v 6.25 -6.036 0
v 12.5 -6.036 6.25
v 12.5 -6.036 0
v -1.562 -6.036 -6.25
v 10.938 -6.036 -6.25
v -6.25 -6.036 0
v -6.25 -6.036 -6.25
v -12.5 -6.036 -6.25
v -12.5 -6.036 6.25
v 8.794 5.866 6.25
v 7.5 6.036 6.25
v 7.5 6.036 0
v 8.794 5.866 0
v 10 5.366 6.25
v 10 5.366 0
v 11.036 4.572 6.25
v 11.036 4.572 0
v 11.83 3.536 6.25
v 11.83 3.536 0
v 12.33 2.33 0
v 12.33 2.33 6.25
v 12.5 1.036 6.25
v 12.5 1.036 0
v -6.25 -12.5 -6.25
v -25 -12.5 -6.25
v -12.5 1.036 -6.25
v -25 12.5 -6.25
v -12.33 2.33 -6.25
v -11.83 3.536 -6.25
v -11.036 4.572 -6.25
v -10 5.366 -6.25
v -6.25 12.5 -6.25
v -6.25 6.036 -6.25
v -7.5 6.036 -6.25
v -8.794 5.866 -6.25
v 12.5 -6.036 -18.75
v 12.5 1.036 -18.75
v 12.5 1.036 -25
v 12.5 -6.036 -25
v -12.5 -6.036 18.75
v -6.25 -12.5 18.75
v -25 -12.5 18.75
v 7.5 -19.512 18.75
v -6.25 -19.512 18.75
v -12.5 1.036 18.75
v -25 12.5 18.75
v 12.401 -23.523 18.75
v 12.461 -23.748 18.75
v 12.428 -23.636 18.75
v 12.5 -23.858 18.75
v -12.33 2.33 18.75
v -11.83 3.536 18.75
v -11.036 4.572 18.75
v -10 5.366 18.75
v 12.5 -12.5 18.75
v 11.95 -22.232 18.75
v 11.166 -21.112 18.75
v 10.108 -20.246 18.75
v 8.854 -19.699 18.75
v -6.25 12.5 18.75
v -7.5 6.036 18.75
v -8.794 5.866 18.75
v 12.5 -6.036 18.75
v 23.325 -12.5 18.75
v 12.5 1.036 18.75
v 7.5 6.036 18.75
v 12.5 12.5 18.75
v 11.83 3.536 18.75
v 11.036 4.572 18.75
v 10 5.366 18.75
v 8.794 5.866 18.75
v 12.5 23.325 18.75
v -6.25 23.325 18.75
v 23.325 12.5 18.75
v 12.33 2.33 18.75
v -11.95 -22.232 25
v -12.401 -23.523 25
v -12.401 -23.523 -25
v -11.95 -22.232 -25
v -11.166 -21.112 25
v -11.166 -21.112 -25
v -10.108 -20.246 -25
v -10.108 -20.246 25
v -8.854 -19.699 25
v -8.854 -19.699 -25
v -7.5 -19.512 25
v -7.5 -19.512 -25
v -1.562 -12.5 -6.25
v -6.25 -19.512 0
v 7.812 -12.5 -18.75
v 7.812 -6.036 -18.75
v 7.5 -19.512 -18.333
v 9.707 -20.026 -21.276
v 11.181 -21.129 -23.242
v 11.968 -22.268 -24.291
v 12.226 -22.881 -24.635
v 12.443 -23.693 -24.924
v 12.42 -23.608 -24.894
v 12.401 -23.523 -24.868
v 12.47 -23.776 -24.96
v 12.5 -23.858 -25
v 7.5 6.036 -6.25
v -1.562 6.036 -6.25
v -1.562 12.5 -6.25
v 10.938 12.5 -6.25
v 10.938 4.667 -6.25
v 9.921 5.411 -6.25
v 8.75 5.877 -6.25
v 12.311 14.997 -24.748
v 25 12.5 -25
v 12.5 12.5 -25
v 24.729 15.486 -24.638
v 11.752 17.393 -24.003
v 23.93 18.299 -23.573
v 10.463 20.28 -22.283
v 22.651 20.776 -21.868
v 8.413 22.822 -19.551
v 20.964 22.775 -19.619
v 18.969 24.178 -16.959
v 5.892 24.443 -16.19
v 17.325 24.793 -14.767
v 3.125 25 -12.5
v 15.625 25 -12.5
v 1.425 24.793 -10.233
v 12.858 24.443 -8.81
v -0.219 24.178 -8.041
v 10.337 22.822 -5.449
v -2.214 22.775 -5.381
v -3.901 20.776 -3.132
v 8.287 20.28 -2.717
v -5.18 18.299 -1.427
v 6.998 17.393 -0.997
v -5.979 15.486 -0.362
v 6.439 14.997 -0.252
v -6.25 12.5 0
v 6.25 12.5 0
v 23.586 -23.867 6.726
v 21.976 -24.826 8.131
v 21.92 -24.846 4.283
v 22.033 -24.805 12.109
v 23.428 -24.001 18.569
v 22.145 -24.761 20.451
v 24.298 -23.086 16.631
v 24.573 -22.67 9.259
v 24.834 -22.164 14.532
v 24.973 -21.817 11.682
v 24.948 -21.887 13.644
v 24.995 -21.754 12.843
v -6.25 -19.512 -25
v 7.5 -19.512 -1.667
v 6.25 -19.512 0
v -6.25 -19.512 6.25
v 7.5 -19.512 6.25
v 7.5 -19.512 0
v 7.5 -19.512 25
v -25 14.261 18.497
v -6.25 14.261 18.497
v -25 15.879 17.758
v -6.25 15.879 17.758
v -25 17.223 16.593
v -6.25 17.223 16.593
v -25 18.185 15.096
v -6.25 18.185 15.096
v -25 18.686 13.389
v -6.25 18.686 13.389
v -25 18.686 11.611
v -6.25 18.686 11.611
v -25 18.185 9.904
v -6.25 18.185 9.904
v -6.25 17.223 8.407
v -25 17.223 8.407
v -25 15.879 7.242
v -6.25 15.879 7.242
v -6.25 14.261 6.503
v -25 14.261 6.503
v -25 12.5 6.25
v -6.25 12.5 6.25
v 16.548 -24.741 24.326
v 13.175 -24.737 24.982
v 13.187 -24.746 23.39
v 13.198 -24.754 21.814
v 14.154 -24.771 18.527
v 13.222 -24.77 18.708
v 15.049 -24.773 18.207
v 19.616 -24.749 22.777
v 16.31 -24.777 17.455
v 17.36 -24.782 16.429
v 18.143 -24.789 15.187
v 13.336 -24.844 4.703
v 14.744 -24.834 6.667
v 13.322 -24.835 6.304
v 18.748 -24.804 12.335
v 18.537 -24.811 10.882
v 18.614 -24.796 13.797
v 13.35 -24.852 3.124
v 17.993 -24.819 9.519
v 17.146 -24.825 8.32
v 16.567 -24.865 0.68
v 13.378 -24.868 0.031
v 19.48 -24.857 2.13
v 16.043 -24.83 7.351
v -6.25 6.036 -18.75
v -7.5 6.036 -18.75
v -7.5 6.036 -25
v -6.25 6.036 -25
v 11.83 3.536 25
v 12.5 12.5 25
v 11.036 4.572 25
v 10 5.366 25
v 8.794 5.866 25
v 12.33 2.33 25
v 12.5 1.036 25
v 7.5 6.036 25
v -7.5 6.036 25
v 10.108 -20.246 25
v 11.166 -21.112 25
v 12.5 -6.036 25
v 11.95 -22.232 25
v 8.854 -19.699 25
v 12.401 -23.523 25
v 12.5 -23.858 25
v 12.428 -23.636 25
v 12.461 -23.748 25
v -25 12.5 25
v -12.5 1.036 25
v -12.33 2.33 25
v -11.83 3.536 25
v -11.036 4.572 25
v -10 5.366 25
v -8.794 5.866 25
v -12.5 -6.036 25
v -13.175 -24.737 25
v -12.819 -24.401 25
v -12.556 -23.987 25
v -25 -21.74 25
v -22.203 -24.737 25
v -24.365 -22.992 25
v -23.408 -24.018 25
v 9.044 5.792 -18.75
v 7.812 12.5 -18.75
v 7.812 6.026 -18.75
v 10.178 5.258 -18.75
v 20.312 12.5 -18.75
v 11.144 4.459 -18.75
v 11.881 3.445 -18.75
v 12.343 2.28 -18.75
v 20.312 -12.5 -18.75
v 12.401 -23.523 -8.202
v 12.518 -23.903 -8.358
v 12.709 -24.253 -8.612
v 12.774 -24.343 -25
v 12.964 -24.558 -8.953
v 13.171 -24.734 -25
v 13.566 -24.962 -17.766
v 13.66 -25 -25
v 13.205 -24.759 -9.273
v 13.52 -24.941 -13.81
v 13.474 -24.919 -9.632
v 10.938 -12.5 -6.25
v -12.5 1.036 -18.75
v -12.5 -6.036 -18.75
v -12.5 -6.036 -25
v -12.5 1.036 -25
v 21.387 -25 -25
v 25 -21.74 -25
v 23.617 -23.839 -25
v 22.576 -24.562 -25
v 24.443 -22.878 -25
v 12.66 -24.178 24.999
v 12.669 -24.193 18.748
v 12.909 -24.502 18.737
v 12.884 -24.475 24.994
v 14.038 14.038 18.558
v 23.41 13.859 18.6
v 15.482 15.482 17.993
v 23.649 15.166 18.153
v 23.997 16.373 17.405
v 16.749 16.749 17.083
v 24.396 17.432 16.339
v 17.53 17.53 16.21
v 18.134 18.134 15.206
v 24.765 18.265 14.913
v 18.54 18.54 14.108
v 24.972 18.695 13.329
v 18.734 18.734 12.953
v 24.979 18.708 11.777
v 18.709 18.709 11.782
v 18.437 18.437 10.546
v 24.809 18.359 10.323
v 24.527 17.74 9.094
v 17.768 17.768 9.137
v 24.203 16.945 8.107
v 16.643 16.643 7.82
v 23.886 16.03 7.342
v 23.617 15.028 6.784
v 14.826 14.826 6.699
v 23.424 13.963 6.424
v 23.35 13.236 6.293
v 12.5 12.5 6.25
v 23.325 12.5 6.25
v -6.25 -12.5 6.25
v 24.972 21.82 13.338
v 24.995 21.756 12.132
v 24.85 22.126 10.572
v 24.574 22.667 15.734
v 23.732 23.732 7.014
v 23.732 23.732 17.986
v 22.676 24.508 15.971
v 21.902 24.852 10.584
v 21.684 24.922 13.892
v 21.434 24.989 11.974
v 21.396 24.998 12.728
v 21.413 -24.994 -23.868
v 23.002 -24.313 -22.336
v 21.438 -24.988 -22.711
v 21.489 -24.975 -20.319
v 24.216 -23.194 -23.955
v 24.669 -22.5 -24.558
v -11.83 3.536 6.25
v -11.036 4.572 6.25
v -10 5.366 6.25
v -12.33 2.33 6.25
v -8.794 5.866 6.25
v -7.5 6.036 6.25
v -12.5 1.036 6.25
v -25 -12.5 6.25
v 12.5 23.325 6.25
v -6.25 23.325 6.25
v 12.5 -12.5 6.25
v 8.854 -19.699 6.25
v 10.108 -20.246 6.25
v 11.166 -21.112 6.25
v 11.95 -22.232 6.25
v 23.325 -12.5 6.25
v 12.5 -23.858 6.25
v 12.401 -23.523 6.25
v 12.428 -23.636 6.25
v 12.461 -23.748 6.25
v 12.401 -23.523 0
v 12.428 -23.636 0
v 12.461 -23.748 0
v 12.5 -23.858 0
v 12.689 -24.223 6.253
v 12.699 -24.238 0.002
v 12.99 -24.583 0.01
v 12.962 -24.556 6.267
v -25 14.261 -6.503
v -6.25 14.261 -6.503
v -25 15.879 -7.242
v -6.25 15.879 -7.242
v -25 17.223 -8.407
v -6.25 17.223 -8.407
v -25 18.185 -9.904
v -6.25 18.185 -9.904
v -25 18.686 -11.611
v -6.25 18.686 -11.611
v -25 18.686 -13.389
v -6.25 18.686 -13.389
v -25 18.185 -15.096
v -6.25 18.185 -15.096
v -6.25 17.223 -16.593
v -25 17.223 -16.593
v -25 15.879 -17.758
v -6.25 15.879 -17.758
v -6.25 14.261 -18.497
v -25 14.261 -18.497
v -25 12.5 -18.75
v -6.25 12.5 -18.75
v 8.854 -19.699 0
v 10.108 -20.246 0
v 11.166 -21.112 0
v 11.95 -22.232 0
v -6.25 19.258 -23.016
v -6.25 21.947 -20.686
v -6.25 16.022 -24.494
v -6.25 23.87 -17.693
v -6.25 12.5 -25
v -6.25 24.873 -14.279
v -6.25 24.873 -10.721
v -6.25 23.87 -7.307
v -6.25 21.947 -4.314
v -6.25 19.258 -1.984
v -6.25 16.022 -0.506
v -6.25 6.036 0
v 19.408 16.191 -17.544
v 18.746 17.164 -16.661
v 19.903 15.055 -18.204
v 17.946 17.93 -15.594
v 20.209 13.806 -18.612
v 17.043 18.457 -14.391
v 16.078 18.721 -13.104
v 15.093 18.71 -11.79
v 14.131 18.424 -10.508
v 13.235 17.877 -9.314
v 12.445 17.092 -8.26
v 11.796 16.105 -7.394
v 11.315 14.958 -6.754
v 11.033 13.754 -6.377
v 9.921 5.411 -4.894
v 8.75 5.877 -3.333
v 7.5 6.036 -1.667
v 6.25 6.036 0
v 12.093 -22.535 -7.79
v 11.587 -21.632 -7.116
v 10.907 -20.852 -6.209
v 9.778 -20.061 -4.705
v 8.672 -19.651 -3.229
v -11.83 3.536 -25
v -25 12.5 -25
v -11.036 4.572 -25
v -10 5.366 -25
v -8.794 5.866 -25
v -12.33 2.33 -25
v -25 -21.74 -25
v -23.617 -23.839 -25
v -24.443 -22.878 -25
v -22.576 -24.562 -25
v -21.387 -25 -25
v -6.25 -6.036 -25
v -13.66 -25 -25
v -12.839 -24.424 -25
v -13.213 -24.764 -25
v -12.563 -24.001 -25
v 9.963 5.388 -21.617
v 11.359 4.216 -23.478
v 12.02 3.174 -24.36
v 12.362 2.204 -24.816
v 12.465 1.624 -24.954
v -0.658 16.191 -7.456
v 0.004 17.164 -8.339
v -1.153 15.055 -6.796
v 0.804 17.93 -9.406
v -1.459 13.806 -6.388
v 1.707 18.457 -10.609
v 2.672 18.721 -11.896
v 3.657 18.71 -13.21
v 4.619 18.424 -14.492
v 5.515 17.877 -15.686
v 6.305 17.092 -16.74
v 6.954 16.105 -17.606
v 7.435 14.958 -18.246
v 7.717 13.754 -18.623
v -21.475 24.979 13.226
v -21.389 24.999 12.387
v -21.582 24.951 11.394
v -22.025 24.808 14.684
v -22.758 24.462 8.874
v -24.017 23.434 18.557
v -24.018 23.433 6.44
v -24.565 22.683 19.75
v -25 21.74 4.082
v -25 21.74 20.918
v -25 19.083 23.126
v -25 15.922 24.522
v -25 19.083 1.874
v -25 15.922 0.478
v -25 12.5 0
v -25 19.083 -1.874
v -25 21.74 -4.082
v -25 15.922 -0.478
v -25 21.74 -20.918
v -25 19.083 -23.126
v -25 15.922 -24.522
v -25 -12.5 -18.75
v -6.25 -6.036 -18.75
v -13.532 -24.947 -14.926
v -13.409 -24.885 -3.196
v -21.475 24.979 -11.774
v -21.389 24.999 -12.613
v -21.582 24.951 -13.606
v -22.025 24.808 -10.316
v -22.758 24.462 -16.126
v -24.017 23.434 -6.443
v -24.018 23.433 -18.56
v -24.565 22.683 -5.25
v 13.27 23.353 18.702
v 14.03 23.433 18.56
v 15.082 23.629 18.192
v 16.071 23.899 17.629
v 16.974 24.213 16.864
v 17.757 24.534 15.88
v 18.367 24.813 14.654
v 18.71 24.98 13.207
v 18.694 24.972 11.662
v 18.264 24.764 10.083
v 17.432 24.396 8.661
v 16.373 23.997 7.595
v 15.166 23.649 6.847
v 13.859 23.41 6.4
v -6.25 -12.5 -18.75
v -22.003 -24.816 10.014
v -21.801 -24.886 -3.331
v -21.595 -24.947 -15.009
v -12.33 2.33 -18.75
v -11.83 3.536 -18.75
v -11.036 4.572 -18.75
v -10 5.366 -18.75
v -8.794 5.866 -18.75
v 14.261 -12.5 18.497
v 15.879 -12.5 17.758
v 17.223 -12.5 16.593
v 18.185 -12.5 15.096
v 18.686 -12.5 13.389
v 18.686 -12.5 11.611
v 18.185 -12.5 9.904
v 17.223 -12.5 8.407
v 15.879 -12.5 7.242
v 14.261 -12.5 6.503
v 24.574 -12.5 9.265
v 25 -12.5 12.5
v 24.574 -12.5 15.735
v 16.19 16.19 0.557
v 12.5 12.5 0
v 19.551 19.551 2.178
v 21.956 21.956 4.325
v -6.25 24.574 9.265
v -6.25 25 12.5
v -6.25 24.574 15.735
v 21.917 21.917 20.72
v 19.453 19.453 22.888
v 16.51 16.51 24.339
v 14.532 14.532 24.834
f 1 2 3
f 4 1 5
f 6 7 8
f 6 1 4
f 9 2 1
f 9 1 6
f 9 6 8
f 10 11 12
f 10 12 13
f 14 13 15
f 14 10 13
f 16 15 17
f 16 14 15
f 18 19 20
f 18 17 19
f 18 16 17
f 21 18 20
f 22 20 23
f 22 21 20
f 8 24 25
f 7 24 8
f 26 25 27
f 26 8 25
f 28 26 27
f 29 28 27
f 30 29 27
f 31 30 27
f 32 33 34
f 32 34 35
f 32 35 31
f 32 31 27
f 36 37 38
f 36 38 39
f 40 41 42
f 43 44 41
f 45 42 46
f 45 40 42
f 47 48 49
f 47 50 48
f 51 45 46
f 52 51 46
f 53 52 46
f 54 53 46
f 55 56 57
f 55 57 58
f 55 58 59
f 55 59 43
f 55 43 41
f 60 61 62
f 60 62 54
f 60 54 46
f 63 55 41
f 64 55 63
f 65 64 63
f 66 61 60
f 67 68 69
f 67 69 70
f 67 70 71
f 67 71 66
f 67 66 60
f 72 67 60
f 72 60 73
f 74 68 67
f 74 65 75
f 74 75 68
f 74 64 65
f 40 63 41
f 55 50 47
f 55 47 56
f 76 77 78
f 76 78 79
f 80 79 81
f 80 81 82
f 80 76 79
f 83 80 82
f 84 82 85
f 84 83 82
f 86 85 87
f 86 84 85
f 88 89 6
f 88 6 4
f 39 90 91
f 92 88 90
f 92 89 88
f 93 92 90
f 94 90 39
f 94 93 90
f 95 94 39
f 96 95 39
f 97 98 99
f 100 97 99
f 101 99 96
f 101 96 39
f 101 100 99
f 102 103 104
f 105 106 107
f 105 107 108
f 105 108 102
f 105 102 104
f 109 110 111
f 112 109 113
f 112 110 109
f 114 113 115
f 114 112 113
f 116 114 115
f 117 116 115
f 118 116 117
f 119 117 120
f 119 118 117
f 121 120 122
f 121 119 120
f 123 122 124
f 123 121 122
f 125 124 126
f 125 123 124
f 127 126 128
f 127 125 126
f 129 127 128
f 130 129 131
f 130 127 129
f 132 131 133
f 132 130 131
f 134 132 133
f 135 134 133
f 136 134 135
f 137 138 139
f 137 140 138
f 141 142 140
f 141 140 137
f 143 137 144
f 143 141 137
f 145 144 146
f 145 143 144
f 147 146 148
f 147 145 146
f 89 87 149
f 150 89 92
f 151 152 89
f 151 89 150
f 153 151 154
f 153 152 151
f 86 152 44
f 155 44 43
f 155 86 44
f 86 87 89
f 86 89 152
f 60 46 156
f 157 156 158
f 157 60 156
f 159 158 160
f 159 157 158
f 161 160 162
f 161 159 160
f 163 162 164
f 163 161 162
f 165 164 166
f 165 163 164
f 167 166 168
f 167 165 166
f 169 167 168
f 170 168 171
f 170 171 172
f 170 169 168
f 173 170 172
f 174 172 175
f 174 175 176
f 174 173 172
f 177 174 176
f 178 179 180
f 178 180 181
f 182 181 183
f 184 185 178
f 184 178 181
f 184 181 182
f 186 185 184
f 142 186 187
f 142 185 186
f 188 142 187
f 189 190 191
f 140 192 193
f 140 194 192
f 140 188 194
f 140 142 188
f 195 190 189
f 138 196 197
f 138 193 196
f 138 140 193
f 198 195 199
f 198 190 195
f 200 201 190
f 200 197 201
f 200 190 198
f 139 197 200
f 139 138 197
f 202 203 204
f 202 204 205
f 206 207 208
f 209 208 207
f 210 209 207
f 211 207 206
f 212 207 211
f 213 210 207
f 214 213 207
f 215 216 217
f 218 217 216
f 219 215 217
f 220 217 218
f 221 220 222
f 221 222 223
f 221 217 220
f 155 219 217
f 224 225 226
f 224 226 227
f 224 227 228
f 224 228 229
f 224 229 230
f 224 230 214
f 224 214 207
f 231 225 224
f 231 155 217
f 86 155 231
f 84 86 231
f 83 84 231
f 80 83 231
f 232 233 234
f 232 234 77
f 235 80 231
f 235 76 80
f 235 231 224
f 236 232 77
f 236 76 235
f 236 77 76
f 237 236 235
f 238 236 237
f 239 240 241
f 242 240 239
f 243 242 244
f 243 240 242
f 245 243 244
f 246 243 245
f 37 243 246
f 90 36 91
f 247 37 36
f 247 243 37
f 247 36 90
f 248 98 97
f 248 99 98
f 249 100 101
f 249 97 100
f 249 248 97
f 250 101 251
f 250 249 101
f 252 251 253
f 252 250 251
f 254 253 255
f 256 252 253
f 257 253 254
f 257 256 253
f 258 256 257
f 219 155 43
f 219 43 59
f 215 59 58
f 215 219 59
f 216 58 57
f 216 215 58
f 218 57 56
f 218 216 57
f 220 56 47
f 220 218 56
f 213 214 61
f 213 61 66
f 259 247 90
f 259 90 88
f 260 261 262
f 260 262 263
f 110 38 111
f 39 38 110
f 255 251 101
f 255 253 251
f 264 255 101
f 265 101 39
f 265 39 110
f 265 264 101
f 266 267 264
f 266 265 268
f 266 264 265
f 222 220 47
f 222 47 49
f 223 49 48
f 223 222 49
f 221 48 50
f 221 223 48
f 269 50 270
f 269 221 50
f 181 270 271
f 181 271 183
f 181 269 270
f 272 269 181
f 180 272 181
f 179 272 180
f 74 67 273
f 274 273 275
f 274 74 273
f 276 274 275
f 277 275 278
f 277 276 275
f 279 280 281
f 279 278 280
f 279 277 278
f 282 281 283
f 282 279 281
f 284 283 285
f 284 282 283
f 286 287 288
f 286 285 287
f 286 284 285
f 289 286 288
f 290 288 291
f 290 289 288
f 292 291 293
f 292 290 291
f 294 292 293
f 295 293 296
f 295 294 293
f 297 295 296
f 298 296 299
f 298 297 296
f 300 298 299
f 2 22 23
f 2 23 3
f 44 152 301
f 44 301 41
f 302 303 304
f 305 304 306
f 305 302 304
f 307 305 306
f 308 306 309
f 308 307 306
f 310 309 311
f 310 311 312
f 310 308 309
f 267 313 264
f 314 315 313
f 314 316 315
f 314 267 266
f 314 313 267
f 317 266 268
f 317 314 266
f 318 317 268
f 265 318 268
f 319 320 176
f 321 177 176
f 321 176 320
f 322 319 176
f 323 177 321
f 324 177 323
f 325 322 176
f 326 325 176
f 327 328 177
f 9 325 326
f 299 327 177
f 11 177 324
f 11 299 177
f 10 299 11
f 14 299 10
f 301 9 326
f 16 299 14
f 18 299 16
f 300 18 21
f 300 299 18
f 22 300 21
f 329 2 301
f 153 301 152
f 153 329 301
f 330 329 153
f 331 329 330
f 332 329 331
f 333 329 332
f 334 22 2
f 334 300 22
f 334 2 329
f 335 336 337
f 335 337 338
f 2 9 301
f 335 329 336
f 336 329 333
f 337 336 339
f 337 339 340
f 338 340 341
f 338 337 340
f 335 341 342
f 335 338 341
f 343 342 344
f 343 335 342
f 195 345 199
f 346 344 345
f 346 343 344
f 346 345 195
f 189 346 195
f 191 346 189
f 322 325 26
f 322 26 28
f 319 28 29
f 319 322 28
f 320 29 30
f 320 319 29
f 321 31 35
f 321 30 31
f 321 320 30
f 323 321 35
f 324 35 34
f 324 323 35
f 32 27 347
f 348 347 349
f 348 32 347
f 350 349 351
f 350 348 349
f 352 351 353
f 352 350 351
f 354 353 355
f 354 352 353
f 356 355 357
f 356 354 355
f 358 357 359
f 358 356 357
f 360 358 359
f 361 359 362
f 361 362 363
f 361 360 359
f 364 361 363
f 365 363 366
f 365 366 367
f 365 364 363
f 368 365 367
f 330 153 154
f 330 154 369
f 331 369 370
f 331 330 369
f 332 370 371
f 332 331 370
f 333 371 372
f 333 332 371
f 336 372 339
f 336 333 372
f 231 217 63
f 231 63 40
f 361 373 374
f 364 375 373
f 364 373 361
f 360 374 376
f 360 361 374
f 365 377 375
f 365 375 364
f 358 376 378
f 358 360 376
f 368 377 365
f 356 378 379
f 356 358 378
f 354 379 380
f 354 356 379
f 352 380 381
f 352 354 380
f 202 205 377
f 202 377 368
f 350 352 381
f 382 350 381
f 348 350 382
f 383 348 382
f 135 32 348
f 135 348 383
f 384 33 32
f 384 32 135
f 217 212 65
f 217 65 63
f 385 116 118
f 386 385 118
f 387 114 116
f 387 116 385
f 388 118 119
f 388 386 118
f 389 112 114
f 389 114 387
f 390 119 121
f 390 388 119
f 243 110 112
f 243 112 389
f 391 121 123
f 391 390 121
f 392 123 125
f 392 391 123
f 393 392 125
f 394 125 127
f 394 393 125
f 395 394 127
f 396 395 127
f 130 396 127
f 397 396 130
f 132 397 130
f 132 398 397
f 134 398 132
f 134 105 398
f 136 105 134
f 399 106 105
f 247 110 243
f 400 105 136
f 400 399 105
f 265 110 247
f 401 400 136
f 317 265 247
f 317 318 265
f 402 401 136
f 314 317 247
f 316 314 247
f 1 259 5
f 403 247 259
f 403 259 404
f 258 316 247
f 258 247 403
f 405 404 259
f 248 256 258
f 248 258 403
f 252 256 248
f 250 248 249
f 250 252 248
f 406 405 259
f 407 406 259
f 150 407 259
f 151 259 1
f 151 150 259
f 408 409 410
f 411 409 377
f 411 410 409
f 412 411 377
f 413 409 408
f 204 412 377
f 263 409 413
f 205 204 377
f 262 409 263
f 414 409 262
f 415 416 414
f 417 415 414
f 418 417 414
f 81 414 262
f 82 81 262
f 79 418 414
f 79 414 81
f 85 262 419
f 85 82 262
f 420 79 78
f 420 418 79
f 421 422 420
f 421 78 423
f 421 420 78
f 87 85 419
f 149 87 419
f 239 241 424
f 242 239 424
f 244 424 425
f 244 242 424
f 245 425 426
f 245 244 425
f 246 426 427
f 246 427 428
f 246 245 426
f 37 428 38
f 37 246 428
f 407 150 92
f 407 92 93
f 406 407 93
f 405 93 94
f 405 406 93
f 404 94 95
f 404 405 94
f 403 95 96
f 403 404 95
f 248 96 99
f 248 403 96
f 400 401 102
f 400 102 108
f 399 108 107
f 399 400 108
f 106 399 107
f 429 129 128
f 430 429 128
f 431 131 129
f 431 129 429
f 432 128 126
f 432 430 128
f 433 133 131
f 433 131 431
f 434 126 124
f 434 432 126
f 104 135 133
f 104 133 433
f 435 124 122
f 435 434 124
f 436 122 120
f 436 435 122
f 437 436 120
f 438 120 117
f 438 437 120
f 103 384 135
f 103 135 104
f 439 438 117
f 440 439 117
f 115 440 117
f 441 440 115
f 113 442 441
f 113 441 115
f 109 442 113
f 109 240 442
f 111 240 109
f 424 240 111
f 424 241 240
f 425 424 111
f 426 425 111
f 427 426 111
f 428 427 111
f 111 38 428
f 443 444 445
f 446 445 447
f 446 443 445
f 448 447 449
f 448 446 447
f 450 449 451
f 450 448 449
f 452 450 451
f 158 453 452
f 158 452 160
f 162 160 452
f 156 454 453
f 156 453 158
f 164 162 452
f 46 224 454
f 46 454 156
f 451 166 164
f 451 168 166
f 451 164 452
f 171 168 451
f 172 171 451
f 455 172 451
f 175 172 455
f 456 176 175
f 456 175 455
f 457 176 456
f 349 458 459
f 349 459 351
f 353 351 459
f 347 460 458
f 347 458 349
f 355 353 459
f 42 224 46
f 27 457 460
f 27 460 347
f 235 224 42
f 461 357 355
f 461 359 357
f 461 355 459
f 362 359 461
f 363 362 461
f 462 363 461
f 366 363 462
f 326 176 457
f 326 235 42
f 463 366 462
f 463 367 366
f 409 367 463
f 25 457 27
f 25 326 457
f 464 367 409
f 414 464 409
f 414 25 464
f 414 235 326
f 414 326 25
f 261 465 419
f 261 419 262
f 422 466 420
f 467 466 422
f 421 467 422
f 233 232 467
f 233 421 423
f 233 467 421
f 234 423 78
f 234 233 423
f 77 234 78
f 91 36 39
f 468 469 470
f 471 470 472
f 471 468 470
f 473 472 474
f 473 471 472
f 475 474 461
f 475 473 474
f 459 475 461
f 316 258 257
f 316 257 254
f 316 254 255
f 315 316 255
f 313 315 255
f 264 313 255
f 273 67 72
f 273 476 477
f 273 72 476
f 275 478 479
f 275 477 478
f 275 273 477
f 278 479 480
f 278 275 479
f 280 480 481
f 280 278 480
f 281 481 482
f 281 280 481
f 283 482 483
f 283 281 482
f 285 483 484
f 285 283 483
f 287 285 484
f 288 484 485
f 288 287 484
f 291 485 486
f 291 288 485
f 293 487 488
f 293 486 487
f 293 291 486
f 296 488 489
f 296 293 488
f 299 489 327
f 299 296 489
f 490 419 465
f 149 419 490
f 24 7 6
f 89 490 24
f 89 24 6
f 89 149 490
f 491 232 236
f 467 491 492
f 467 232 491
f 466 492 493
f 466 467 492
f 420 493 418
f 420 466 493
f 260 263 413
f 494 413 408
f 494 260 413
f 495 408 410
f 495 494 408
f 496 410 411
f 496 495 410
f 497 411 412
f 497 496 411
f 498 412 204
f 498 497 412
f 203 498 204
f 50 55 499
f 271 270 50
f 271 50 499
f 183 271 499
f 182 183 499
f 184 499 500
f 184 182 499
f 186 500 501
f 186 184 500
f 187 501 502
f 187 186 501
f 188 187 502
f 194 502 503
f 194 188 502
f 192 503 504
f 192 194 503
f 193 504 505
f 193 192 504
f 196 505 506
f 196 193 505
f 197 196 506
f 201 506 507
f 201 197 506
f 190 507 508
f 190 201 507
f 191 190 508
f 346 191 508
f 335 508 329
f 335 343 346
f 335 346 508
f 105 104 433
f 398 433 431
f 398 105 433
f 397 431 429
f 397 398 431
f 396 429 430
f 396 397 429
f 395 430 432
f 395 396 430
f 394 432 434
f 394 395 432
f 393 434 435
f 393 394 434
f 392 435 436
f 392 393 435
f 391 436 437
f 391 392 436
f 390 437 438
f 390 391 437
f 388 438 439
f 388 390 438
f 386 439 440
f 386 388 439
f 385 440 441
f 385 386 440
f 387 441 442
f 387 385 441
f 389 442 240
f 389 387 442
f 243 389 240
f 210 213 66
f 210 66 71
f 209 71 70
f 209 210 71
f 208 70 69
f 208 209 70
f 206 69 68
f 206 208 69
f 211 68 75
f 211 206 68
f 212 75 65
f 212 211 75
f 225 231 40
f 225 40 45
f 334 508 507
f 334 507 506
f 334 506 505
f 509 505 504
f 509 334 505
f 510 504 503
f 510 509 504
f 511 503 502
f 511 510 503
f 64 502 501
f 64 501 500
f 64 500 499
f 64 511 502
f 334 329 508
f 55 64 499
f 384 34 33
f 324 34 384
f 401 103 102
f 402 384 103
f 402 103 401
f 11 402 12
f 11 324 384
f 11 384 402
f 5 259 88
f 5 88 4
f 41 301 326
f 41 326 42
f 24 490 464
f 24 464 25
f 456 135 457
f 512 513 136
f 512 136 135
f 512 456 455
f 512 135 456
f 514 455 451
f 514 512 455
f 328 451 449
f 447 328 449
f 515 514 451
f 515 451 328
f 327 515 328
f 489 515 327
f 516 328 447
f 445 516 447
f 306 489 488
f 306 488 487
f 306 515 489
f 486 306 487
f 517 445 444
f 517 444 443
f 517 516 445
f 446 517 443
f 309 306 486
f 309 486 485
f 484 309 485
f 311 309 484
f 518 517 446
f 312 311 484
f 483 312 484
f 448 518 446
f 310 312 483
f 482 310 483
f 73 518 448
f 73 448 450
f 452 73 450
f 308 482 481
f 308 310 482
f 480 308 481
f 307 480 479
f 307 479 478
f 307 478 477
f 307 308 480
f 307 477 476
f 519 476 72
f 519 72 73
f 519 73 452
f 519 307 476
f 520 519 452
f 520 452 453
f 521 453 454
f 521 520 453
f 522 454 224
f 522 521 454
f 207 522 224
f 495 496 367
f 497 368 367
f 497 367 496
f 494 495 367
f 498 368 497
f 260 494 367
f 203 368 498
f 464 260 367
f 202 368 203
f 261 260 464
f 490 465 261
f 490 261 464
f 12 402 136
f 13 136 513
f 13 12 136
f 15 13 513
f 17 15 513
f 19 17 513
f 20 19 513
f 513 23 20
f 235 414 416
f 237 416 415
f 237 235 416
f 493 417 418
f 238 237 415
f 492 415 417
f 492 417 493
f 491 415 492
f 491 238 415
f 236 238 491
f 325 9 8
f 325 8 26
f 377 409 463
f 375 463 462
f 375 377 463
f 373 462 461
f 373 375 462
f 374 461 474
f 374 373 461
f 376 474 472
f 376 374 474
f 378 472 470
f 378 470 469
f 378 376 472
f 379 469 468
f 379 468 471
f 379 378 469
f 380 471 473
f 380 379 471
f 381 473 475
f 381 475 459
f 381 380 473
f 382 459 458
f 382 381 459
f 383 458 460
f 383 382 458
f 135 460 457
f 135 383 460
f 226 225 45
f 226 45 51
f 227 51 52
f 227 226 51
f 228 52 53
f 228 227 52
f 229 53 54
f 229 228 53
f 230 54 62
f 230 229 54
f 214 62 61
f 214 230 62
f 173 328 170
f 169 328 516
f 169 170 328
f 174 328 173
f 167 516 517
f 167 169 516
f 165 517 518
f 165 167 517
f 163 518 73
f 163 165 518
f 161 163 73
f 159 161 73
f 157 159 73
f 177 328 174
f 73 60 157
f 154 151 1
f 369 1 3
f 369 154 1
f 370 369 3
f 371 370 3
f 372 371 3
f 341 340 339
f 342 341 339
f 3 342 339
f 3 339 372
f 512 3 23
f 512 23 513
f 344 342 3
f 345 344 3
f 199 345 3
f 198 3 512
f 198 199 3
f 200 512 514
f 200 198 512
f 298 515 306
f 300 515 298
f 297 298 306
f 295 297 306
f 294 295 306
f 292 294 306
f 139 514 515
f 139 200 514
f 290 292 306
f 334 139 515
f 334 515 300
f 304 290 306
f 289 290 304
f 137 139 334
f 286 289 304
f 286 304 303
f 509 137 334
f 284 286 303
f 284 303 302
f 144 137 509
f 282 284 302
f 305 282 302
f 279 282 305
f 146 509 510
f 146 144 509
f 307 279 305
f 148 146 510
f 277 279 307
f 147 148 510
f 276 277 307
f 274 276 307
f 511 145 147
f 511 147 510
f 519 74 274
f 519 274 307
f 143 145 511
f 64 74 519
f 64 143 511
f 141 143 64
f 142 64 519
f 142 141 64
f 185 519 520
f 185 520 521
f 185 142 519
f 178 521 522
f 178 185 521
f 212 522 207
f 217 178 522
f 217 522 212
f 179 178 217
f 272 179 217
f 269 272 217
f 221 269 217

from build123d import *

# Parameters (mm, degrees)
F2_DEPTH = 25
F3_DEPTH = 25
F5_DEPTH = 50


with BuildPart() as f2:
    # F0 (on Front) → F2 (new body, symmetric)
    with BuildSketch(Plane.XZ):
        with BuildLine():
            Line((-25, 25), (-25, -25))
            Line((-25, -25), (-6.25, -25))
            Line((-6.25, -25), (-6.25, 0))
            Line((-6.25, 0), (12.5, -25))
            Line((12.5, -25), (25, -25))
            Line((25, -25), (6.25, 0))
            Line((6.25, 0), (12.5, 0))
            ThreePointArc((12.5, 0), (25, 12.5), (12.5, 25))
            Line((12.5, 25), (-25, 25))
        make_face()
        with BuildLine():
            Line((12.5, 6.25), (-6.25, 6.25))
            Line((-6.25, 6.25), (-6.25, 18.75))
            Line((-6.25, 18.75), (12.5, 18.75))
            ThreePointArc((12.5, 18.75), (18.75, 12.5), (12.5, 6.25))
        make_face(mode=Mode.SUBTRACT)
    extrude(amount=F2_DEPTH, both=True)

    # F1 (on Right) → F3 (intersect, symmetric)
    with BuildSketch(Plane.YZ):
        with BuildLine():
            Line((-25, -25), (12.5, -25))
            ThreePointArc((12.5, -25), (25, -12.5), (12.5, 0))
            ThreePointArc((12.5, 0), (25, 12.5), (12.5, 25))
            Line((12.5, 25), (-24.736971, 25.042934))
            Line((-24.736971, 25.042934), (-25, -25))
        make_face()
        with BuildLine():
            Line((-12.5, -6.25), (12.5, -6.25))
            ThreePointArc((12.5, -6.25), (18.75, -12.5), (12.5, -18.75))
            Line((12.5, -18.75), (-12.5, -18.75))
            Line((-12.5, -18.75), (-12.5, -6.25))
        make_face(mode=Mode.SUBTRACT)
        with BuildLine():
            Line((-12.5, 18.75), (12.5, 18.75))
            ThreePointArc((12.5, 18.75), (18.75, 12.5), (12.5, 6.25))
            Line((12.5, 6.25), (-12.5, 6.25))
            Line((-12.5, 6.25), (-12.5, 18.75))
        make_face(mode=Mode.SUBTRACT)
    extrude(amount=F3_DEPTH, both=True, mode=Mode.INTERSECT)

    # F4 (on face) → F5 (intersect)
    with BuildSketch(Plane.XY.offset(25)):
        with BuildLine():
            ThreePointArc((25.267377, 20.127007), (23.802911, 23.662541), (20.267377, 25.127007))
            Line((20.267377, 25.127007), (-20.267377, 25.127007))
            ThreePointArc((-20.267377, 25.127007), (-23.802911, 23.662541), (-25.267377, 20.127007))
            Line((-25.267377, 20.127007), (-25.267377, -20.127007))
            ThreePointArc((-25.267377, -20.127007), (-23.802911, -23.662541), (-20.267377, -25.127007))
            Line((-20.267377, -25.127007), (-14.361611, -25.127007))
            ThreePointArc((-14.361611, -25.127007), (-13.09501, -24.674819), (-12.401151, -23.522729))
            ThreePointArc((-12.401151, -23.522729), (-10.666503, -20.642503), (-7.5, -19.512033))
            Line((-7.5, -19.512033), (7.5, -19.512033))
            ThreePointArc((7.5, -19.512033), (10.666503, -20.642503), (12.401151, -23.522729))
            ThreePointArc((12.401151, -23.522729), (13.09501, -24.674819), (14.361611, -25.127007))
            Line((14.361611, -25.127007), (20.267377, -25.127007))
            ThreePointArc((20.267377, -25.127007), (23.802911, -23.662541), (25.267377, -20.127007))
            Line((25.267377, -20.127007), (25.267377, 20.127007))
        make_face()
        with BuildLine():
            Line((-7.5, 6.036096), (7.5, 6.036096))
            ThreePointArc((7.5, 6.036096), (11.035534, 4.57163), (12.5, 1.036096))
            Line((12.5, 1.036096), (12.5, -6.036096))
            Line((12.5, -6.036096), (-12.5, -6.036096))
            Line((-12.5, -6.036096), (-12.5, 1.036096))
            ThreePointArc((-12.5, 1.036096), (-11.035534, 4.57163), (-7.5, 6.036096))
        make_face(mode=Mode.SUBTRACT)
    extrude(amount=-F5_DEPTH, mode=Mode.INTERSECT)


solid = f2.part
